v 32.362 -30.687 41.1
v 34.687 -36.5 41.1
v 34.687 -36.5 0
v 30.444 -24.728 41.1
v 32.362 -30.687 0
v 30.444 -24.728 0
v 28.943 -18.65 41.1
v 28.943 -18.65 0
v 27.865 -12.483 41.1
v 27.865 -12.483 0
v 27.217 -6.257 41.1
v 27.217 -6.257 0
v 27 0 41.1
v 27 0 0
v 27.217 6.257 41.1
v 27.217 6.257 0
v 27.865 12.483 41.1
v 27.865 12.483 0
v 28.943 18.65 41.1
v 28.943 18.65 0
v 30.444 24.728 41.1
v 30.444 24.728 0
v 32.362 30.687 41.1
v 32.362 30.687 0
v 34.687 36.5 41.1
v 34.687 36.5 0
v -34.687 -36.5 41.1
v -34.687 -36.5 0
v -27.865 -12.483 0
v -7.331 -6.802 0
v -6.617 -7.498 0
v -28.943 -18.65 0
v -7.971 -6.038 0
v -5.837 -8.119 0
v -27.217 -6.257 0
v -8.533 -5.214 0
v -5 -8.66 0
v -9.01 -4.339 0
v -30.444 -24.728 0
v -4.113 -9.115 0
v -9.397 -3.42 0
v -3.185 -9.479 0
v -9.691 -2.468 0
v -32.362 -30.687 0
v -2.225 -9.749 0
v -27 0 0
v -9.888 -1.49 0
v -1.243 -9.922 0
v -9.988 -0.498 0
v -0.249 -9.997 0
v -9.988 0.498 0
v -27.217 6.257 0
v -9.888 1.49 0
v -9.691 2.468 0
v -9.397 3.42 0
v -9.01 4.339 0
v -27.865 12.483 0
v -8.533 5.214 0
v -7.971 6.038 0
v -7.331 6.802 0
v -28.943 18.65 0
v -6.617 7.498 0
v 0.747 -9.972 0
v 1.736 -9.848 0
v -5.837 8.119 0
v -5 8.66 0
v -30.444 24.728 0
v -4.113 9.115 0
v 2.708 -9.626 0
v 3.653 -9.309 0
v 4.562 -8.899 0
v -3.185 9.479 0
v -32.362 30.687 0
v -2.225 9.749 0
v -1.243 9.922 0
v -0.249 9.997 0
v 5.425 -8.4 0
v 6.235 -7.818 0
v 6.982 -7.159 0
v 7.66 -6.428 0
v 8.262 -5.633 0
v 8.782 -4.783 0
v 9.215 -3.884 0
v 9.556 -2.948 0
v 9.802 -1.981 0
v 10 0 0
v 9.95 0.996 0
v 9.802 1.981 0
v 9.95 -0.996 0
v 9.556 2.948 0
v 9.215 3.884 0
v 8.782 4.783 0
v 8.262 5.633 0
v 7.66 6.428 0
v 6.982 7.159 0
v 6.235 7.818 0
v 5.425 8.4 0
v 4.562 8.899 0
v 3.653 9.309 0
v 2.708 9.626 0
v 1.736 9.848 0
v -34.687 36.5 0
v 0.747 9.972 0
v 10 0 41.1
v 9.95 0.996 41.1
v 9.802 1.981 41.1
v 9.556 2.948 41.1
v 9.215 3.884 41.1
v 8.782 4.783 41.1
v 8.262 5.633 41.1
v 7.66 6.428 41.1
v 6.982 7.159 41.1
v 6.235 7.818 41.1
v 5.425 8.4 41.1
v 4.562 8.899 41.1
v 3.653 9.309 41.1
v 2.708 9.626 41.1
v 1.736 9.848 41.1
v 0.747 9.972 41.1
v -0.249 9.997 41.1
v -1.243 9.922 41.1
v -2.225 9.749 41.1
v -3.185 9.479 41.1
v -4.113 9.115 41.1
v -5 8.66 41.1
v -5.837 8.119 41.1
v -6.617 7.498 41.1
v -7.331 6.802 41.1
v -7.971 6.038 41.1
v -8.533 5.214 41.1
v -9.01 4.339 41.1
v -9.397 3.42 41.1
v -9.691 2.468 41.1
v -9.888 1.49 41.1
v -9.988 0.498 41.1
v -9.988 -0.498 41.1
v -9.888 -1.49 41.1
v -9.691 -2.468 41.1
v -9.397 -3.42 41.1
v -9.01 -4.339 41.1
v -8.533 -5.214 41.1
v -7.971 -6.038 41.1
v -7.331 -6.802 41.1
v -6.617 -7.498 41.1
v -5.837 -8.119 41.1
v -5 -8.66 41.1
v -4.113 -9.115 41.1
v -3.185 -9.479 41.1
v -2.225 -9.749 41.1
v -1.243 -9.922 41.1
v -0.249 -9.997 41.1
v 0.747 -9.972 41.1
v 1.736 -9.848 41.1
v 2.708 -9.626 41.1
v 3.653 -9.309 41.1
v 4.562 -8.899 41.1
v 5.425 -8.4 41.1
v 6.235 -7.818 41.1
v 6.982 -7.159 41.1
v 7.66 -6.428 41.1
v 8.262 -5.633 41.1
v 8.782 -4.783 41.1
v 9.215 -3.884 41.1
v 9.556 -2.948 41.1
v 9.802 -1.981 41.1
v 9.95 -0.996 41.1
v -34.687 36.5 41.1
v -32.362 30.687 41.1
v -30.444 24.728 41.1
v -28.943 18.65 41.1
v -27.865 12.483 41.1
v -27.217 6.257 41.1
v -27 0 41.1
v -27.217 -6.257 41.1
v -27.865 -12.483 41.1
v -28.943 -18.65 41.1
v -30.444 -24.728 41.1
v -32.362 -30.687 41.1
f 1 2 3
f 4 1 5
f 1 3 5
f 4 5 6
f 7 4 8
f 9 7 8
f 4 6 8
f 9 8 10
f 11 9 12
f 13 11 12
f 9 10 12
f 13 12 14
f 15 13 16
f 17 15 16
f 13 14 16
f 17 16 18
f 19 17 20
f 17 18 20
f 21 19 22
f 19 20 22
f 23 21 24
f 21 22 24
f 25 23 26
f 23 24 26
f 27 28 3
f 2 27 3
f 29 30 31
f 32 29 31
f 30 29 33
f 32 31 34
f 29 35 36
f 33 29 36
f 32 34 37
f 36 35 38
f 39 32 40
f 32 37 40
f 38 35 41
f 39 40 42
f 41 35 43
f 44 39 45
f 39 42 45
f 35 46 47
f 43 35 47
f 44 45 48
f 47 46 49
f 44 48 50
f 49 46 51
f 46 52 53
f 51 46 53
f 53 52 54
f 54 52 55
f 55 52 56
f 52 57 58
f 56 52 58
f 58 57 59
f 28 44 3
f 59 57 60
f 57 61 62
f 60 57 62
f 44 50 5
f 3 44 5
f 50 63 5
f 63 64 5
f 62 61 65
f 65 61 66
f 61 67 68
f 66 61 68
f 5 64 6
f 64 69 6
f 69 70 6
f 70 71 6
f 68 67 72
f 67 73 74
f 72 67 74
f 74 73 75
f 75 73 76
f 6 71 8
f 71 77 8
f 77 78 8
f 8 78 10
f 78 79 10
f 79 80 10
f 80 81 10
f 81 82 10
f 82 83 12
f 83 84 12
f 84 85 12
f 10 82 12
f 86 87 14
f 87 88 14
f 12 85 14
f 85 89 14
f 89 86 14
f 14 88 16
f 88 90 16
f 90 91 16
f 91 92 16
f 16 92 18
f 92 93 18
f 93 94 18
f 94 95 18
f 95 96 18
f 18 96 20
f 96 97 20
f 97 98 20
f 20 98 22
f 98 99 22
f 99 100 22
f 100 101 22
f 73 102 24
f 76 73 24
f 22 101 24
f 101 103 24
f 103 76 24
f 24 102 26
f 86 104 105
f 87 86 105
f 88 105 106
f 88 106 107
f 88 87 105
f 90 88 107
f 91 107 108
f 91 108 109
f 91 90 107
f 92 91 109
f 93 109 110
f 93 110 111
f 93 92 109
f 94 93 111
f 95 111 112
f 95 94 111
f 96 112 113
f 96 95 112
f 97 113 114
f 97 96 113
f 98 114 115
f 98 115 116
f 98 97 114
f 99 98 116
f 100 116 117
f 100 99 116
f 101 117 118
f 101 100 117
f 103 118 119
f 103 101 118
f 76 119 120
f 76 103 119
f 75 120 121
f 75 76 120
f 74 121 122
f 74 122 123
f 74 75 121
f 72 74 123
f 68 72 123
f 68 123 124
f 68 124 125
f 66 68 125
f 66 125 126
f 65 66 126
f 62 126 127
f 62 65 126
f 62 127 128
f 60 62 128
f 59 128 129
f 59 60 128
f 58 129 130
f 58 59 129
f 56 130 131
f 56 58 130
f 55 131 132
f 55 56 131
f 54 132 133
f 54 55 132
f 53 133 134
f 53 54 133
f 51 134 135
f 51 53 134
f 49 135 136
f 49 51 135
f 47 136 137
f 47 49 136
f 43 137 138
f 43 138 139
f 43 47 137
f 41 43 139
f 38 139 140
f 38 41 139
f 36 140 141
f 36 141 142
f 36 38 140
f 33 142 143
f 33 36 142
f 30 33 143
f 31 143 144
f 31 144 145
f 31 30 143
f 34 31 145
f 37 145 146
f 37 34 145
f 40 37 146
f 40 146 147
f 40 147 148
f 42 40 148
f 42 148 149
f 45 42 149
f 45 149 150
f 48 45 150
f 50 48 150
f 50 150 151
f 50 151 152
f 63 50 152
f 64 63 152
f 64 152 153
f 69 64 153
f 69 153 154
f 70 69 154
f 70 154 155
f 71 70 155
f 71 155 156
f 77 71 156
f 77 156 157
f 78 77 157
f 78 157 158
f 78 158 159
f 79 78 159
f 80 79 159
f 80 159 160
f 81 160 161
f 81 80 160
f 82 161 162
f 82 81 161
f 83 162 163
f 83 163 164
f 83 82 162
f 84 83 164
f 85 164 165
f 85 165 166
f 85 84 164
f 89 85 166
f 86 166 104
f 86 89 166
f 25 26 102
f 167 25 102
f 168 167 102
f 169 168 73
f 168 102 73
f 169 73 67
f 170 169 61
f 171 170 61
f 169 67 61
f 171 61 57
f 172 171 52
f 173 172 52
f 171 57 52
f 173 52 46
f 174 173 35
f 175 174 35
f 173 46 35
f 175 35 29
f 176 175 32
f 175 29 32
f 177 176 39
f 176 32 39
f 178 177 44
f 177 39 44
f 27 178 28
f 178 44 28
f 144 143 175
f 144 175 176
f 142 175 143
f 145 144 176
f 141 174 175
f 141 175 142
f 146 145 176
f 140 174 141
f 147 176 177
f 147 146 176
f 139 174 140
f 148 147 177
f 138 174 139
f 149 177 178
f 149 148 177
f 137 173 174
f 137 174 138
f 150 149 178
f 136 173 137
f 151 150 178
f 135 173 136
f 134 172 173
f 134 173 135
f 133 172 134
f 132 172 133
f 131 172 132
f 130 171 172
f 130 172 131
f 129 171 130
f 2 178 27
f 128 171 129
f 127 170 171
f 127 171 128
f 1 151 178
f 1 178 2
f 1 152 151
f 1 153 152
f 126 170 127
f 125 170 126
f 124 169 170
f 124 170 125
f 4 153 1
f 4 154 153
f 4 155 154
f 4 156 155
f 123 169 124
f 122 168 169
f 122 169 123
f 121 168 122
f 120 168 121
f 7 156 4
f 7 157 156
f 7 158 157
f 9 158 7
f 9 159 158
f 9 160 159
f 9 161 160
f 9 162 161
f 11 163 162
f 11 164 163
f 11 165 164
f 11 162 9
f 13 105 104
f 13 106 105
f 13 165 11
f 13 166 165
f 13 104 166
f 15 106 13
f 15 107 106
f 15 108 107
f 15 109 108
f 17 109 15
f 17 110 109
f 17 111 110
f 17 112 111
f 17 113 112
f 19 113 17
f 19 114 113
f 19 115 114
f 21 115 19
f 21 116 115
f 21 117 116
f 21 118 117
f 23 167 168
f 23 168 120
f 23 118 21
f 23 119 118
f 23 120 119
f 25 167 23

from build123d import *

# Parameters (mm, degrees)
F0_R     = 10
F1_DEPTH = 41.1


# Not quite as in the source:
# - a feature names something its author has since deleted; it is built from what else it names


with BuildPart() as f1:
    # F0 (on Top) → F1 (new body)
    with BuildSketch(Plane.XY):
        with BuildLine():
            ThreePointArc((-34.6869575489, 36.5), (-27, 0), (-34.6869575489, -36.5))
            Line((-34.6869575489, -36.5), (34.6869575489, -36.5))
            ThreePointArc((34.6869575489, -36.5), (27, 0), (34.6869575489, 36.5))
            Line((34.6869575489, 36.5), (-34.6869575489, 36.5))
        make_face()
        Circle(F0_R, mode=Mode.SUBTRACT)
    extrude(amount=F1_DEPTH)


solid = f1.part
